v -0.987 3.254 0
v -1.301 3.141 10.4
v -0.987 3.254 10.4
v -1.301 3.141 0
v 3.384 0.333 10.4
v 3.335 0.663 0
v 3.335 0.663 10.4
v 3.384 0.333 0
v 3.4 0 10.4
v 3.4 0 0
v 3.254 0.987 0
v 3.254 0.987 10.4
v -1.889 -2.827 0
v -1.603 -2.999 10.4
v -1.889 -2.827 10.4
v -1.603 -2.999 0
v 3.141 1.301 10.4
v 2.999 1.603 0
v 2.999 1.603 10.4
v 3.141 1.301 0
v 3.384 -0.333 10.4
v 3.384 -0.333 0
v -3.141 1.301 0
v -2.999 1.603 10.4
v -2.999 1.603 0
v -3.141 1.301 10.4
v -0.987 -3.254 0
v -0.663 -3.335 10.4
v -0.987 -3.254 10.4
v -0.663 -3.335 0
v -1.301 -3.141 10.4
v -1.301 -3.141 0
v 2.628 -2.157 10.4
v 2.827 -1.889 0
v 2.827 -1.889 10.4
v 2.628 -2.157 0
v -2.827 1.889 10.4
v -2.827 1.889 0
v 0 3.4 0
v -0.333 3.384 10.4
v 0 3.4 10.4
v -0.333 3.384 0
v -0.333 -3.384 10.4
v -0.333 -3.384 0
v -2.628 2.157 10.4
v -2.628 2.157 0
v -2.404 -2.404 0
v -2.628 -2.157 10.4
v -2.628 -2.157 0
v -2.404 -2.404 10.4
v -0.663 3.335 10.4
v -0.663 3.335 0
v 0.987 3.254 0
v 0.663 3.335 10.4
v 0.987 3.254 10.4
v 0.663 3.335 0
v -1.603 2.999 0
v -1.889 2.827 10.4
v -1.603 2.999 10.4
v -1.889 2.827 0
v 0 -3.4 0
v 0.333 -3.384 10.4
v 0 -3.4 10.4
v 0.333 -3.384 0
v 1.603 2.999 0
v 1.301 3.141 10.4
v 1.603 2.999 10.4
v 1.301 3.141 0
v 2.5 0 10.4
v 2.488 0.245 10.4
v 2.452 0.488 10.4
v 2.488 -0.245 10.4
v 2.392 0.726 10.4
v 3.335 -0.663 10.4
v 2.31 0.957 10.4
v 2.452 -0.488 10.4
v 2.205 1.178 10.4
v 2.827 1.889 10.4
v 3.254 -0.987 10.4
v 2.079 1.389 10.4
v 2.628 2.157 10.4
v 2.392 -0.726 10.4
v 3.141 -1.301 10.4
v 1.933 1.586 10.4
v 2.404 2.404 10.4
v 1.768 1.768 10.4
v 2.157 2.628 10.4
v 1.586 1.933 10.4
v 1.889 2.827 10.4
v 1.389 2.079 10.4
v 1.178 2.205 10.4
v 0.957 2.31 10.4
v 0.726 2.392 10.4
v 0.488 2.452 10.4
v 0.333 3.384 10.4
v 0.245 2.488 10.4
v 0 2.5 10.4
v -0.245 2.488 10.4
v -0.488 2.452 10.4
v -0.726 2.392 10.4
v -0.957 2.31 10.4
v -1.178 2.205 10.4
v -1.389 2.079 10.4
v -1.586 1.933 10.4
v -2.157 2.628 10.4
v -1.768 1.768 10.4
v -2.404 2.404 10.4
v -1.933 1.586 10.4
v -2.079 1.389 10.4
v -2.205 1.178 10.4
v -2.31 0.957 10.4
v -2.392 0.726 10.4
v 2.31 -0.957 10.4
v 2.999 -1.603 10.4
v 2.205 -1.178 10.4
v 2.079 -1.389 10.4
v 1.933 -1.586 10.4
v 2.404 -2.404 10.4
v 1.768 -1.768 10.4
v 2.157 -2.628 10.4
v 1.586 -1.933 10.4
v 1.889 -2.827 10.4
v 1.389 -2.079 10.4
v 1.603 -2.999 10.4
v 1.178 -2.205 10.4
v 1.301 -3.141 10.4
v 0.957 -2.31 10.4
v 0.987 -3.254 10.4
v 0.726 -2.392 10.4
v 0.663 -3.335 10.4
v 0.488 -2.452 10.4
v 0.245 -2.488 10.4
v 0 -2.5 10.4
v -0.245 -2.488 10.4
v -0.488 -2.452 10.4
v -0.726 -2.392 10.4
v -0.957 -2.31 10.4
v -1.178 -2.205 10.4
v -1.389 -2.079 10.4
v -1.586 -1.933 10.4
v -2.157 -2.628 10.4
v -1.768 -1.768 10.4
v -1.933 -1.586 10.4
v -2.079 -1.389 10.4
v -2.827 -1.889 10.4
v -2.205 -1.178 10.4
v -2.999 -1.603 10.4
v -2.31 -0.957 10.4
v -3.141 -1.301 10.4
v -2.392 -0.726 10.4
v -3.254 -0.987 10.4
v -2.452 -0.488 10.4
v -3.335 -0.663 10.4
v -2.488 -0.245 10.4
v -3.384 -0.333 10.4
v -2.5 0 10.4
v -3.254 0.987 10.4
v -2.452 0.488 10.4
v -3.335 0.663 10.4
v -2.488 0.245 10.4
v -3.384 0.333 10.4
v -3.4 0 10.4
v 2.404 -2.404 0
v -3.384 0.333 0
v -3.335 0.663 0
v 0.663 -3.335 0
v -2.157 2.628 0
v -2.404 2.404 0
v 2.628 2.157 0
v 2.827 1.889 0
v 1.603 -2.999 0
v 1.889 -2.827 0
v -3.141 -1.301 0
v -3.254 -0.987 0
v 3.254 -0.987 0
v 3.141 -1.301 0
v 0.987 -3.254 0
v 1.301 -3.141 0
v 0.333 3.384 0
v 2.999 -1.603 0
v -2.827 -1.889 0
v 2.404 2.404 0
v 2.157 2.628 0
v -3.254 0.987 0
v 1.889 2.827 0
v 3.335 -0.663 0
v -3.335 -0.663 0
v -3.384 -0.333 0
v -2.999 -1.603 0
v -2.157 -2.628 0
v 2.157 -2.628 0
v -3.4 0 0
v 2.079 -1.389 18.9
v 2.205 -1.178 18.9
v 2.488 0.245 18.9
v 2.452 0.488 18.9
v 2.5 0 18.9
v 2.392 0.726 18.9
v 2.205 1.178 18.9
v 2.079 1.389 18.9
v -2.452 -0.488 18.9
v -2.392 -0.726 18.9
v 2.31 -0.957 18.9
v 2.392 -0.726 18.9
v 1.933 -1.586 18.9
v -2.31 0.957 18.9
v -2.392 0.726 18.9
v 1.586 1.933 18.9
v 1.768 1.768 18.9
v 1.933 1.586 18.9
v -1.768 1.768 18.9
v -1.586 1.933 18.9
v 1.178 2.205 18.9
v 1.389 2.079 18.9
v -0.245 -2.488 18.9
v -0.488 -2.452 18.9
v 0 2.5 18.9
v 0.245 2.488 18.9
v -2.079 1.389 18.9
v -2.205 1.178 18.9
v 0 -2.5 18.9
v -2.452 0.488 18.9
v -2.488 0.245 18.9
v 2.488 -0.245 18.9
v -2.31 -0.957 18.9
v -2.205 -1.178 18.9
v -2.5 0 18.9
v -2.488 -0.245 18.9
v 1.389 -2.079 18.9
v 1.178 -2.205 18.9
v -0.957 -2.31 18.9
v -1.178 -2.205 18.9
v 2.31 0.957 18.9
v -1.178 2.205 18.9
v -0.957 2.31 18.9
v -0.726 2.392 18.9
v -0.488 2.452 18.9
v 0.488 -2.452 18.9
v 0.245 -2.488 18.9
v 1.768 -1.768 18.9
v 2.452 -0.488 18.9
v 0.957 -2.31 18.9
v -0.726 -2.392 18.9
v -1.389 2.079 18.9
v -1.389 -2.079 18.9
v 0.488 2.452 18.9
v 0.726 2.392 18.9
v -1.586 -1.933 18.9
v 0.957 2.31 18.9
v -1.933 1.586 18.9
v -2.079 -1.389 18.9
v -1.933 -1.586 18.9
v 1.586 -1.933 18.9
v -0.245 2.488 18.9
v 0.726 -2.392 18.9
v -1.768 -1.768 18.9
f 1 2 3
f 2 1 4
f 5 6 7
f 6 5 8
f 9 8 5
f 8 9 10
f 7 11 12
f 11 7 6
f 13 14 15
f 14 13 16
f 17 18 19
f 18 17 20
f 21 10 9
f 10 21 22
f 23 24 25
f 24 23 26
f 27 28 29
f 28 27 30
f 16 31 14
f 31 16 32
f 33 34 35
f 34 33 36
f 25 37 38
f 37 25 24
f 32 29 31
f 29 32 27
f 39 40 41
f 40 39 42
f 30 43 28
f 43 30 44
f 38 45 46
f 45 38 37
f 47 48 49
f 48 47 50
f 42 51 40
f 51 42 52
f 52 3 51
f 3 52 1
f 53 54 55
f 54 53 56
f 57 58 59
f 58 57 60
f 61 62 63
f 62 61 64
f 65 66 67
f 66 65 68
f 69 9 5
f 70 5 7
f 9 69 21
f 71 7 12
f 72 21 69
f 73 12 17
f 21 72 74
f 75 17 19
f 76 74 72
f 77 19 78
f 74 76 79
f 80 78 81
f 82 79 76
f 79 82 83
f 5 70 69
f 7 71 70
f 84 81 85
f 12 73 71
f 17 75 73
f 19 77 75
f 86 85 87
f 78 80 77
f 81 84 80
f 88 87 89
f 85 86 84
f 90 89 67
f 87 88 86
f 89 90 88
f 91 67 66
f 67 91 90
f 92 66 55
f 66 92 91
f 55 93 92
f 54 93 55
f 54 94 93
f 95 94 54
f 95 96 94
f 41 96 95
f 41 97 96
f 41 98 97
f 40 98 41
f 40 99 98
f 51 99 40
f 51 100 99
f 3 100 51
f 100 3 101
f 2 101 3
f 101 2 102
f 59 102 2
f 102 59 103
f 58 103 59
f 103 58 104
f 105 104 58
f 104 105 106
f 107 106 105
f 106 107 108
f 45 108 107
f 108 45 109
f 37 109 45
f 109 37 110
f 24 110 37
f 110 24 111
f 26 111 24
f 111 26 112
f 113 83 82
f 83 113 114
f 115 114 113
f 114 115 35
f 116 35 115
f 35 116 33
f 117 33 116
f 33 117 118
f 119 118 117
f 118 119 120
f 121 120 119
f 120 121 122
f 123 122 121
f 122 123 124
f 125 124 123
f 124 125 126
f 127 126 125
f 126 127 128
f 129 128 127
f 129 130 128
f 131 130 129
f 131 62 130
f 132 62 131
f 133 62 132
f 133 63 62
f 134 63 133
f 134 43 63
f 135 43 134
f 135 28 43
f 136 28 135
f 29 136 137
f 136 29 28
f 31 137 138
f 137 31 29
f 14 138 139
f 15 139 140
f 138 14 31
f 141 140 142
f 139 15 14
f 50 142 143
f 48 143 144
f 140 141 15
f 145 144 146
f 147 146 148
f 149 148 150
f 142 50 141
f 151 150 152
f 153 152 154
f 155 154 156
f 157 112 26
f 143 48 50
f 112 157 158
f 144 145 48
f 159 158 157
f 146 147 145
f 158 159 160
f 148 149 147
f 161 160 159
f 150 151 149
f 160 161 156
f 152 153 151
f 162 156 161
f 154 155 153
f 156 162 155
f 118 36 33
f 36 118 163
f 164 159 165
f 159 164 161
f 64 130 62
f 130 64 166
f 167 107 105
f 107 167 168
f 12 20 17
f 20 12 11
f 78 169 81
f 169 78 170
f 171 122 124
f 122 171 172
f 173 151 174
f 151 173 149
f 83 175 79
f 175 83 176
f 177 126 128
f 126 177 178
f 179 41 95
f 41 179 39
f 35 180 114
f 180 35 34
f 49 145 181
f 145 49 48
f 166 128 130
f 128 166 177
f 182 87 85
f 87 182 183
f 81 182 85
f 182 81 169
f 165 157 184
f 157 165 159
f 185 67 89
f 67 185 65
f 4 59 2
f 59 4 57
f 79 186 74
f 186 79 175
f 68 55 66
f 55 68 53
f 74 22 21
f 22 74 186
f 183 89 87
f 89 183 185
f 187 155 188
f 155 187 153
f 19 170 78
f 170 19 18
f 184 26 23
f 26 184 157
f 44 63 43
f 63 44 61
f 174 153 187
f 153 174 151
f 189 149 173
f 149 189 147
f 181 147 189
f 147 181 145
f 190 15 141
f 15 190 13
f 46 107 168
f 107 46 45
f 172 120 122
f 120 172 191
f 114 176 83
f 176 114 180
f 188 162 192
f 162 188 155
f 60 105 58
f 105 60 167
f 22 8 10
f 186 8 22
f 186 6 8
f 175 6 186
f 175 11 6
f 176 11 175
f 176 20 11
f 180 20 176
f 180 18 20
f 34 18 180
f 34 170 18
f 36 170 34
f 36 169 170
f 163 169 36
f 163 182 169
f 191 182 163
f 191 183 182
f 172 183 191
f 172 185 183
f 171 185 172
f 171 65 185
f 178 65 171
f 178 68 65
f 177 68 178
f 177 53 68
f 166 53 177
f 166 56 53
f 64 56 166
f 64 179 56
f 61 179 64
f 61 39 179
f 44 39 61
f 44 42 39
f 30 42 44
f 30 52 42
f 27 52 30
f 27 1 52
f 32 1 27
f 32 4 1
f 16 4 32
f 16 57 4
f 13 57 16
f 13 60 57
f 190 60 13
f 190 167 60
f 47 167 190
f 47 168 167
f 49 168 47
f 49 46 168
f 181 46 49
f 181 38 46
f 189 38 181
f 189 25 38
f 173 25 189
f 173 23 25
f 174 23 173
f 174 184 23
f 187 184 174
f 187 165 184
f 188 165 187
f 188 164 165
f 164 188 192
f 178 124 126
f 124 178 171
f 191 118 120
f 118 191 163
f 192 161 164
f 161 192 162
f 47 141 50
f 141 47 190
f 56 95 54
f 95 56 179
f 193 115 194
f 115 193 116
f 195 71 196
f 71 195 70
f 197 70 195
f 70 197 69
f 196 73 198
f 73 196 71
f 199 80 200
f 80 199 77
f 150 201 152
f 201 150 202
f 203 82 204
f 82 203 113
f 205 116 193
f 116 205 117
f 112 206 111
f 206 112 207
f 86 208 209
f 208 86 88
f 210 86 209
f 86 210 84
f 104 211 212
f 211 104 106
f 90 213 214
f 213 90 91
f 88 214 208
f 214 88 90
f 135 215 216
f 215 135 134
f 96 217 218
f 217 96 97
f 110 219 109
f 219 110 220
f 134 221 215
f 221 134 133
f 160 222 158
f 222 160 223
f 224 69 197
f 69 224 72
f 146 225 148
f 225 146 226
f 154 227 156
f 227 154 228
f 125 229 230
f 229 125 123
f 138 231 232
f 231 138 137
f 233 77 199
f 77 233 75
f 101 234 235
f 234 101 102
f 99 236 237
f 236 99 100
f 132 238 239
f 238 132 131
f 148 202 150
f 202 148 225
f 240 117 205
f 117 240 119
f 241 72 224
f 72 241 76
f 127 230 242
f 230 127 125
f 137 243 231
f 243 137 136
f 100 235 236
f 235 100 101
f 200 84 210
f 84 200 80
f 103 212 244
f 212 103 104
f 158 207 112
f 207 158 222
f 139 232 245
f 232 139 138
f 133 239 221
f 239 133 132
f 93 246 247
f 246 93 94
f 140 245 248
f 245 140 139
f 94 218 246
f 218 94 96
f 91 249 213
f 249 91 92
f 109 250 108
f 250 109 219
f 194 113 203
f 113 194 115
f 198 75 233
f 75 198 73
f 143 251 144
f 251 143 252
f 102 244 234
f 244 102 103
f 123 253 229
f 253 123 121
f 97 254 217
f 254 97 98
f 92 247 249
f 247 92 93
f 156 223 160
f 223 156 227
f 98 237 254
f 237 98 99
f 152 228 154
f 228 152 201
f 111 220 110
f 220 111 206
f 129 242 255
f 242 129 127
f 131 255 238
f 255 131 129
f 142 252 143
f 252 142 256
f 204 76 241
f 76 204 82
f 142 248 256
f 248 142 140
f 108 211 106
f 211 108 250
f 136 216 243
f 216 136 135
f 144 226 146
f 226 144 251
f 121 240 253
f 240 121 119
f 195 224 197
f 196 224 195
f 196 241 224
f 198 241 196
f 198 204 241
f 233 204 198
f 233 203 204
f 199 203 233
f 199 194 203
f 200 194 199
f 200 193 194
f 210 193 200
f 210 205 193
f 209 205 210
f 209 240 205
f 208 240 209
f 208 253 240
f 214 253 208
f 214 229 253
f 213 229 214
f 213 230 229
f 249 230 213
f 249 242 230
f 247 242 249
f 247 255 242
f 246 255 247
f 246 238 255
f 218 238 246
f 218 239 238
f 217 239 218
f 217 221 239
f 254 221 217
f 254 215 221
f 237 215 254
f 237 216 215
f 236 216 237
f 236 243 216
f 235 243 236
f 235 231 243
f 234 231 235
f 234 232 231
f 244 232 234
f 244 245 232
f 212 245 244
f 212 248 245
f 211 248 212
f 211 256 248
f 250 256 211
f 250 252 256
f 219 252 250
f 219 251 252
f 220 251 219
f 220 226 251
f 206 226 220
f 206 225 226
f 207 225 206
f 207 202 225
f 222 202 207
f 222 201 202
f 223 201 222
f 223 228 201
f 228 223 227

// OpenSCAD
// Badschrank cylinders
// d1=5, l1=8.5 (top/small), d2=6.8, l2=10.4 (bottom/large)

d1 = 5;
d2 = 6.8;
l1 = 8.5;
l2 = 10.4;

// Large cylinder on bottom
cylinder(h = l2, d = d2, center = false, $fn = 64);

// Small cylinder on top
translate([0, 0, l2])
    cylinder(h = l1, d = d1, center = false, $fn = 64);
